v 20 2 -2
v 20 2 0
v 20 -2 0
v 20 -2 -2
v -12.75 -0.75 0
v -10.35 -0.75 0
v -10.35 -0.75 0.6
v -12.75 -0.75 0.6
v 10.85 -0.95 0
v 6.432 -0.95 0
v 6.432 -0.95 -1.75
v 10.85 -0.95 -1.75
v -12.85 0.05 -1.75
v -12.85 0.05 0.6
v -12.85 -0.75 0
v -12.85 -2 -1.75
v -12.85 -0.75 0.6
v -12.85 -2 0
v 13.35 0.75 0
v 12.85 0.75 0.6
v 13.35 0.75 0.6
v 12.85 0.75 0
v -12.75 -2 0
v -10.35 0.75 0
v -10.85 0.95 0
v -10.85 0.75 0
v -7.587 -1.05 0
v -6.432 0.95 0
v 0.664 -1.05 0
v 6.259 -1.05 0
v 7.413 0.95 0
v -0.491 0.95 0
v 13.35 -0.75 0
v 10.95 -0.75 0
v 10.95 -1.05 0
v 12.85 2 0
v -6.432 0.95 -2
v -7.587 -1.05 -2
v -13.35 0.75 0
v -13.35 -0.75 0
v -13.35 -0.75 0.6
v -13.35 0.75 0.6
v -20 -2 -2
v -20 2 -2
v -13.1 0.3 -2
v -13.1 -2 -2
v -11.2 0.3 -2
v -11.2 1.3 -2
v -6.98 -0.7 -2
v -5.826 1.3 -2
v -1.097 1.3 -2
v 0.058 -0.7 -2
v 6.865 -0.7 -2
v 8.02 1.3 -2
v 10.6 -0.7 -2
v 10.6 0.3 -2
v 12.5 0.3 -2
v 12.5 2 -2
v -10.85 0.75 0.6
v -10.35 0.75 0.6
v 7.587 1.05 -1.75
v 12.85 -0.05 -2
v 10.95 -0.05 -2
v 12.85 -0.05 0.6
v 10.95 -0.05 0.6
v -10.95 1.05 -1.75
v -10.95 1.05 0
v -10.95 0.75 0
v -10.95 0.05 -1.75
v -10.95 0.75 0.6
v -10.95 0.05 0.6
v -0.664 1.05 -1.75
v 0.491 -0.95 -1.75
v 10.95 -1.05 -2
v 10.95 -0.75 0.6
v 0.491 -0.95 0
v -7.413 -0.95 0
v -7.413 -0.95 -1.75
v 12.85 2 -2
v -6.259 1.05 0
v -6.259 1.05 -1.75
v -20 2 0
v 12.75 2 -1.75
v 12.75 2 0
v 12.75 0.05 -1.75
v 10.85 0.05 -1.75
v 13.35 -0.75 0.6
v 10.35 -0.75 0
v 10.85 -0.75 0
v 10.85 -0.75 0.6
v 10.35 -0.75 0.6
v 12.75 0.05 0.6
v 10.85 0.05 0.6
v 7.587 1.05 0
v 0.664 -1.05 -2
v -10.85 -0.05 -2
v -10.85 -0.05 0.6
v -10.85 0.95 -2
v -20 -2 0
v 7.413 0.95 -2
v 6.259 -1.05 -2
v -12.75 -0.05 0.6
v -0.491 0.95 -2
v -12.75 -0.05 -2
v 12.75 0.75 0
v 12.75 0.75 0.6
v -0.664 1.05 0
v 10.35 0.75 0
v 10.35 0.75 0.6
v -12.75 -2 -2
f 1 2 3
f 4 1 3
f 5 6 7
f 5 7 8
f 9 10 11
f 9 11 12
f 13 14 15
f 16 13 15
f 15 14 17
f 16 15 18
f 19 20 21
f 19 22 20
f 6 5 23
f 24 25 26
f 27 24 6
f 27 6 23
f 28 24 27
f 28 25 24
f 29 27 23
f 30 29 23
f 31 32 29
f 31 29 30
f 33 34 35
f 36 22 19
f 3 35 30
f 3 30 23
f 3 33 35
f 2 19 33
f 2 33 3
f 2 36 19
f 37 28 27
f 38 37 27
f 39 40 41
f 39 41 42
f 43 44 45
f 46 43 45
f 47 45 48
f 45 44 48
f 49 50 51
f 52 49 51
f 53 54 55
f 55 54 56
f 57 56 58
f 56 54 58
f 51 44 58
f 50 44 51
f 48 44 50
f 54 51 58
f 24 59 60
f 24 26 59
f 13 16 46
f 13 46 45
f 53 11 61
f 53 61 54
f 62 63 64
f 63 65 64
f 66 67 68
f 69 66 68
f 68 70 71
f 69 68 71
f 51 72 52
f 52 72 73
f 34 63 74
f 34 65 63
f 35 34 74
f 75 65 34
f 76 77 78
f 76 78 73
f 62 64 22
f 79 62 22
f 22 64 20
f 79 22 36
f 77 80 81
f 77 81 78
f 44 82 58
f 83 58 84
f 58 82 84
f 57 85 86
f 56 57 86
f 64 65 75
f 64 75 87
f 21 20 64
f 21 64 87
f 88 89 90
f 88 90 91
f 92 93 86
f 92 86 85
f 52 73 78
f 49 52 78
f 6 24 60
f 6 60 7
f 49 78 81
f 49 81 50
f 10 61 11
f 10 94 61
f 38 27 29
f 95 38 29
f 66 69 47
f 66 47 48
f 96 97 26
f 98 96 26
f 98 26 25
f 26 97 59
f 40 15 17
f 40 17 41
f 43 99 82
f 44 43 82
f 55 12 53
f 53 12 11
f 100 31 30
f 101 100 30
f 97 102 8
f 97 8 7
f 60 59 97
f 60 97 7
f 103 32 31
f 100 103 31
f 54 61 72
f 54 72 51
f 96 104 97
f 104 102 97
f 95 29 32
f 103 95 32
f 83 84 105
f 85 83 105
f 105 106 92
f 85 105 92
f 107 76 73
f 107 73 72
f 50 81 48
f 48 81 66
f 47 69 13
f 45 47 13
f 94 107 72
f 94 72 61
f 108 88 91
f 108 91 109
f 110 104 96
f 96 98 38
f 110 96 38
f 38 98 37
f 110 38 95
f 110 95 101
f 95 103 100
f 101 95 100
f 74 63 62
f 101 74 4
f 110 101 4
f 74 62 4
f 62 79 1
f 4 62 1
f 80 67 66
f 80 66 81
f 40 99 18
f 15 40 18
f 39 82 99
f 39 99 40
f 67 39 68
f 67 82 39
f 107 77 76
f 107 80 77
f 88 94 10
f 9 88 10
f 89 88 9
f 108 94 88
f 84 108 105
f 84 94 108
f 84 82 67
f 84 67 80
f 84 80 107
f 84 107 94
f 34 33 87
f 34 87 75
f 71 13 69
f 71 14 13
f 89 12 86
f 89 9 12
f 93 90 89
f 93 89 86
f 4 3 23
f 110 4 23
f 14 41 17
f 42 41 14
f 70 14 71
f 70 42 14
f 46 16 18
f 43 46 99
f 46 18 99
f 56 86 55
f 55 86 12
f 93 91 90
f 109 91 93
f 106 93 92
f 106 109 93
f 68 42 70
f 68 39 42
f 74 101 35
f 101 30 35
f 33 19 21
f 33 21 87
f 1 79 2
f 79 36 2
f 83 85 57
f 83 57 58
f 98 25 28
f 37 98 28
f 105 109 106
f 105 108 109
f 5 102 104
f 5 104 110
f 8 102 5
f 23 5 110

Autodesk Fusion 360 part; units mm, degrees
sketch "Sketch1" plane through (0, 0, 0) normal (0, 0, 1) x (1, 0, 0)
  line L0 (-20, 2) -> (20, 2)
  line L1 (20, 2) -> (20, -2)
  line L2 (20, -2) -> (-20, -2)
  line L3 (-20, -2) -> (-20, 2)
  line L4 (0, -2) -> (0, 2) construction
  line L5 (-20, 0) -> (20, 0) construction
  line L6 (-11.85, 2) -> (-11.85, -2) construction
  line L7 (11.85, 2) -> (11.85, -2) construction
  line L8 (-12.75, 2) -> (-12.75, -2)
  line L9 (-12.45, 2) -> (-12.45, -2) construction
  line L10 (-11.25, 2) -> (-11.25, -2) construction
  line L11 (-10.95, 2) -> (-10.95, -2)
  line L12 (11.25, 2) -> (11.25, -2) construction
  line L13 (12.45, 2) -> (12.45, -2) construction
  line L14 (10.95, 2) -> (10.95, -2)
  line L15 (12.75, 2) -> (12.75, -2)
  line L16 (-13.35, 0.75) -> (-10.35, 0.75)
  line L17 (-10.35, 0.75) -> (-10.35, -0.75)
  line L18 (-10.35, -0.75) -> (-13.35, -0.75)
  line L19 (-13.35, -0.75) -> (-13.35, 0.75)
  line L20 (10.35, 0.75) -> (13.35, 0.75)
  line L21 (13.35, 0.75) -> (13.35, -0.75)
  line L22 (13.35, -0.75) -> (10.35, -0.75)
  line L23 (10.35, -0.75) -> (10.35, 0.75)
  line L24 (-11.85, 1) -> (-6.3453, 1) construction
  line L25 (-6.3453, 1) -> (-7.5, -1) construction
  line L26 (-7.5, -1) -> (0.5774, -1) construction
  line L27 (0.5774, -1) -> (-0.5774, 1) construction
  line L28 (-0.5774, 1) -> (7.5, 1) construction
  line L29 (7.5, 1) -> (6.3453, -1) construction
  line L30 (6.3453, -1) -> (11.85, -1) construction
  line L31 (-3.4613, -1) -> (-3.4613, 2) construction
  line L32 (3.4613, 1) -> (3.4613, -2) construction
  line L33 (-12.85, 0.05) -> (-10.95, 0.05)
  line L34 (-10.95, 1.05) -> (-6.2587, 1.05)
  line L35 (-6.2587, 1.05) -> (-7.4134, -0.95)
  line L36 (-7.4134, -0.95) -> (0.4907, -0.95)
  line L37 (0.4907, -0.95) -> (-0.664, 1.05)
  line L38 (-0.664, 1.05) -> (7.5866, 1.05)
  line L39 (7.5866, 1.05) -> (6.4319, -0.95)
  line L40 (6.4319, -0.95) -> (10.85, -0.95)
  line L41 (-12.85, 0.05) -> (-12.85, -2)
  line L42 (-12.75, -0.05) -> (-10.85, -0.05)
  line L43 (-10.85, -0.05) -> (-10.85, 0.95)
  line L44 (-10.85, 0.95) -> (-6.4319, 0.95)
  line L45 (-6.4319, 0.95) -> (-7.5866, -1.05)
  line L46 (-7.5866, -1.05) -> (0.664, -1.05)
  line L47 (0.664, -1.05) -> (-0.4907, 0.95)
  line L48 (-0.4907, 0.95) -> (7.4134, 0.95)
  line L49 (7.4134, 0.95) -> (6.2587, -1.05)
  line L50 (6.2587, -1.05) -> (10.95, -1.05)
  line L51 (10.85, -0.95) -> (10.85, -0.903)
  line L52 (10.85, -0.903) -> (10.85, 0.05)
  line L53 (10.85, 0.05) -> (12.75, 0.05)
  line L54 (10.95, -0.05) -> (12.85, -0.05)
  line L55 (12.85, -0.05) -> (12.85, 2)
  line L56 (-12.25, 2) -> (-12.25, -2) construction
  line L57 (-11.45, -2) -> (-11.45, 2) construction
  line L58 (11.45, 2) -> (11.45, -2) construction
  line L59 (12.25, 2) -> (12.25, -2) construction
  point P0 (-6.9226, 0)
  point P1 (6.9226, 0)
  point P2 (-11.85, 0)
  point P3 (11.85, 0)
  dimension "d123" = 40
  dimension "d124" = 1.2
  dimension "d125" = 1.8
  dimension "d127" = 4
  dimension "d128" = 3
  dimension "d129" = 1.5
  dimension "d130" = 30
  dimension "d131" = 2
  dimension "d132" = 15
  dimension "d133" = 0.1
  dimension "d134" = 0.1
  dimension "d136" = 0.1
  dimension "d137" = 0.1
  dimension "d138" = 0.1
  dimension "d139" = 0.1
  dimension "d140" = 0.1
  dimension "d141" = 0.1
  dimension "d142" = 0.1
  dimension "d143" = 0.1
  dimension "d144" = 0.1
  dimension "d145" = 0.1
  dimension "d146" = 0.1
  dimension "d147" = 0.8
  dimension "d161" = 22.5
sketch "Sketch2" plane through (0, 0, 0) normal (0, 1, 0) x (1, 0, 0)
  line L0 (10.95, 0) -> (12.75, 0)
  line L1 (12.75, 0) -> (12.75, -0.4)
  line L2 (12.75, -0.4) -> (12.25, -0.4)
  line L3 (12.25, -0.4) -> (12.25, -1.8)
  line L4 (12.25, -1.8) -> (12.45, -1.8)
  line L5 (12.45, -1.8) -> (12.45, -2.4)
  line L6 (12.45, -2.4) -> (11.25, -2.4)
  line L7 (11.25, -2.4) -> (11.25, -1.8)
  line L8 (11.25, -1.8) -> (11.45, -1.8)
  line L9 (11.45, -1.8) -> (11.45, -0.4)
  line L10 (11.45, -0.4) -> (10.95, -0.4)
  line L11 (10.95, -0.4) -> (10.95, 0)
  line L12 (11.85, 0.4) -> (11.85, -2.4) construction
  line L13 (-12.45, -1.8) -> (-12.25, -1.8)
  line L14 (-10.95, 0) -> (-10.95, -0.4)
  line L15 (-11.45, -0.4) -> (-11.45, -1.8)
  line L16 (-12.25, -1.8) -> (-12.25, -0.4)
  line L17 (-10.95, -0.4) -> (-11.45, -0.4)
  line L18 (-12.75, -0.4) -> (-12.75, 0)
  line L19 (-12.75, 0) -> (-10.95, 0)
  line L20 (-11.25, -1.8) -> (-11.25, -2.4)
  line L21 (-11.85, 0.4) -> (-11.85, -2.4) construction
  line L22 (-12.25, -0.4) -> (-12.75, -0.4)
  line L23 (-12.45, -2.4) -> (-12.45, -1.8)
  line L24 (-11.45, -1.8) -> (-11.25, -1.8)
  line L25 (-11.25, -2.4) -> (-12.45, -2.4)
  line L26 (11.1644, 0) -> (11.5, 0.4)
  line L27 (12.2, 0.4) -> (12.5356, 0)
  line L28 (-11.1644, 0) -> (-11.5, 0.4)
  line L29 (-12.2, 0.4) -> (-12.5356, 0)
  line L30 (12.2, 0.4) -> (11.5, 0.4)
  line L31 (-12.2, 0.4) -> (-11.5, 0.4)
  point P0 (11.85, 0)
  point P1 (12.45, 0)
  point P2 (12.75, 0)
  point P3 (12.25, 0)
  point P4 (-11.85, 0)
  point P5 (-11.45, 0)
  point P6 (-11.25, 0)
  point P7 (-10.95, 0)
  dimension "d148" = 2.4
  dimension "d149" = 1.2
  dimension "d150" = 0.6
  dimension "d151" = 0.4
  dimension "d162" = 50
  dimension "d163" = 0.4
  dimension "d164" = 0.7
extrude "Extrude2" add sketch "Sketch1" against normal blind 2 contours L0 L2 L3 L8 L16 L18 L19 L41 | L0 L8 L11 L16 | L0 L11 L14 L20 L22 L23 L34 L35 L36 L37 L38 L39 L40 L51 L52 | L8 L11 L16 L33 | L8 L16 L18 L19 L33 L41 | L0 L14 L15 L20 | L14 L15 L20 L53 | L14 L20 L22 L23 L52 L53 makes body 1
extrude "Extrude3" add sketch "Sketch1" along normal blind 0.6 contours L8 L11 L16 L33 | L8 L16 L18 L19 L33 L41 | L14 L15 L20 L53 | L14 L20 L22 L23 L52 L53 bodies 1
extrude "Extrude1" add sketch "Sketch1" against normal up to surface (2 mm away) separate body contours L2 L8 L11 L18 | L8 L11 L18 L42 | L2 L11 L14 L16 L17 L18 L43 L44 L45 L46 L47 L48 L49 L50 | L11 L16 L17 L18 L42 L43 | L0 L1 L2 L15 L20 L21 L22 L55 | L2 L14 L15 L22 | L15 L20 L21 L22 L54 L55 | L14 L15 L22 L54 makes body 2 in component "Join 2"
extrude "Extrude2'" add sketch "Sketch1" along normal up to surface (0.6 mm away) contours L8 L11 L18 L42 | L11 L16 L17 L18 L42 L43 | L15 L20 L21 L22 L54 L55 | L14 L15 L22 L54 bodies 2 in component "Join 2"
chamfer "Chamfer2" distance 0.25 angle 45 13 edges at (-12.85, -0.975, -2) (-11.9, 0.05, -2) (-10.95, 0.55, -2) (-8.6043, 1.05, -2) (-6.836, 0.05, -2) (-3.4613, -0.95, -2) (-0.0866, 0.05, -2) (3.4613, 1.05, -2) (7.0093, 0.05, -2) (8.641, -0.95, -2) (10.85, -0.45, -2) (11.8, 0.05, -2) (12.75, 1.025, -2) measured on face at (-17.6167, 0.0167, -2) measured on face at (-17.6167, 0.0167, -2) measured on face at (-17.6167, 0.0167, -2) measured on face at (-17.6167, 0.0167, -2) measured on face at (-17.6167, 0.0167, -2) measured on face at (-17.6167, 0.0167, -2) measured on face at (-17.6167, 0.0167, -2) measured on face at (-17.6167, 0.0167, -2) measured on face at (-17.6167, 0.0167, -2) measured on face at (-17.6167, 0.0167, -2) measured on face at (-17.6167, 0.0167, -2) measured on face at (-17.6167, 0.0167, -2) measured on face at (-17.6167, 0.0167, -2) on bodies 1
component "Join 2" placed x (1, 0, 0) y (0, 1, 0) z (0, 0, 1) at (0, 0, 0)
equation "Gauge = 22.5 mm"
equation "SleeperThickness = 2 mm"
equation "Tollerance = 0.1 mm"
equation "SleeperSpcing = Gauge / 1.5"
equation "d115 = Gauge / 37.5"
equation "d123 = d127 * 10"
equation "d124 = Gauge / 18.75"
equation "d125 = d124 * 1.5"
equation "d126 = Gauge"
equation "d127 = Gauge / 5.625"
equation "d128 = d124 * 2.5"
equation "d129 = d128 / 2"
equation "d130 = Angular Dimension-2"
equation "d131 = d127 / 2"
equation "d132 = d161 / 1.5"
equation "d133 = Tollerance"
equation "d134 = d133"
equation "d136 = d133"
equation "d137 = d133"
equation "d138 = d133"
equation "d139 = d133"
equation "d140 = d133"
equation "d141 = d133"
equation "d142 = d133"
equation "d143 = d133"
equation "d144 = d133"
equation "d145 = d133"
equation "d146 = d133"
equation "d147 = d124 / 1.5"
equation "d148 = d149 * 2"
equation "d150 = d149 / 2"
equation "d151 = d149 / 3"
equation "d160 = Gauge"
equation "d161 = Gauge"
equation "d162 = Angular Dimension-2"
equation "d163 = d149 / 3"
equation "d164 = d149 / 1.2 * 0.7"
